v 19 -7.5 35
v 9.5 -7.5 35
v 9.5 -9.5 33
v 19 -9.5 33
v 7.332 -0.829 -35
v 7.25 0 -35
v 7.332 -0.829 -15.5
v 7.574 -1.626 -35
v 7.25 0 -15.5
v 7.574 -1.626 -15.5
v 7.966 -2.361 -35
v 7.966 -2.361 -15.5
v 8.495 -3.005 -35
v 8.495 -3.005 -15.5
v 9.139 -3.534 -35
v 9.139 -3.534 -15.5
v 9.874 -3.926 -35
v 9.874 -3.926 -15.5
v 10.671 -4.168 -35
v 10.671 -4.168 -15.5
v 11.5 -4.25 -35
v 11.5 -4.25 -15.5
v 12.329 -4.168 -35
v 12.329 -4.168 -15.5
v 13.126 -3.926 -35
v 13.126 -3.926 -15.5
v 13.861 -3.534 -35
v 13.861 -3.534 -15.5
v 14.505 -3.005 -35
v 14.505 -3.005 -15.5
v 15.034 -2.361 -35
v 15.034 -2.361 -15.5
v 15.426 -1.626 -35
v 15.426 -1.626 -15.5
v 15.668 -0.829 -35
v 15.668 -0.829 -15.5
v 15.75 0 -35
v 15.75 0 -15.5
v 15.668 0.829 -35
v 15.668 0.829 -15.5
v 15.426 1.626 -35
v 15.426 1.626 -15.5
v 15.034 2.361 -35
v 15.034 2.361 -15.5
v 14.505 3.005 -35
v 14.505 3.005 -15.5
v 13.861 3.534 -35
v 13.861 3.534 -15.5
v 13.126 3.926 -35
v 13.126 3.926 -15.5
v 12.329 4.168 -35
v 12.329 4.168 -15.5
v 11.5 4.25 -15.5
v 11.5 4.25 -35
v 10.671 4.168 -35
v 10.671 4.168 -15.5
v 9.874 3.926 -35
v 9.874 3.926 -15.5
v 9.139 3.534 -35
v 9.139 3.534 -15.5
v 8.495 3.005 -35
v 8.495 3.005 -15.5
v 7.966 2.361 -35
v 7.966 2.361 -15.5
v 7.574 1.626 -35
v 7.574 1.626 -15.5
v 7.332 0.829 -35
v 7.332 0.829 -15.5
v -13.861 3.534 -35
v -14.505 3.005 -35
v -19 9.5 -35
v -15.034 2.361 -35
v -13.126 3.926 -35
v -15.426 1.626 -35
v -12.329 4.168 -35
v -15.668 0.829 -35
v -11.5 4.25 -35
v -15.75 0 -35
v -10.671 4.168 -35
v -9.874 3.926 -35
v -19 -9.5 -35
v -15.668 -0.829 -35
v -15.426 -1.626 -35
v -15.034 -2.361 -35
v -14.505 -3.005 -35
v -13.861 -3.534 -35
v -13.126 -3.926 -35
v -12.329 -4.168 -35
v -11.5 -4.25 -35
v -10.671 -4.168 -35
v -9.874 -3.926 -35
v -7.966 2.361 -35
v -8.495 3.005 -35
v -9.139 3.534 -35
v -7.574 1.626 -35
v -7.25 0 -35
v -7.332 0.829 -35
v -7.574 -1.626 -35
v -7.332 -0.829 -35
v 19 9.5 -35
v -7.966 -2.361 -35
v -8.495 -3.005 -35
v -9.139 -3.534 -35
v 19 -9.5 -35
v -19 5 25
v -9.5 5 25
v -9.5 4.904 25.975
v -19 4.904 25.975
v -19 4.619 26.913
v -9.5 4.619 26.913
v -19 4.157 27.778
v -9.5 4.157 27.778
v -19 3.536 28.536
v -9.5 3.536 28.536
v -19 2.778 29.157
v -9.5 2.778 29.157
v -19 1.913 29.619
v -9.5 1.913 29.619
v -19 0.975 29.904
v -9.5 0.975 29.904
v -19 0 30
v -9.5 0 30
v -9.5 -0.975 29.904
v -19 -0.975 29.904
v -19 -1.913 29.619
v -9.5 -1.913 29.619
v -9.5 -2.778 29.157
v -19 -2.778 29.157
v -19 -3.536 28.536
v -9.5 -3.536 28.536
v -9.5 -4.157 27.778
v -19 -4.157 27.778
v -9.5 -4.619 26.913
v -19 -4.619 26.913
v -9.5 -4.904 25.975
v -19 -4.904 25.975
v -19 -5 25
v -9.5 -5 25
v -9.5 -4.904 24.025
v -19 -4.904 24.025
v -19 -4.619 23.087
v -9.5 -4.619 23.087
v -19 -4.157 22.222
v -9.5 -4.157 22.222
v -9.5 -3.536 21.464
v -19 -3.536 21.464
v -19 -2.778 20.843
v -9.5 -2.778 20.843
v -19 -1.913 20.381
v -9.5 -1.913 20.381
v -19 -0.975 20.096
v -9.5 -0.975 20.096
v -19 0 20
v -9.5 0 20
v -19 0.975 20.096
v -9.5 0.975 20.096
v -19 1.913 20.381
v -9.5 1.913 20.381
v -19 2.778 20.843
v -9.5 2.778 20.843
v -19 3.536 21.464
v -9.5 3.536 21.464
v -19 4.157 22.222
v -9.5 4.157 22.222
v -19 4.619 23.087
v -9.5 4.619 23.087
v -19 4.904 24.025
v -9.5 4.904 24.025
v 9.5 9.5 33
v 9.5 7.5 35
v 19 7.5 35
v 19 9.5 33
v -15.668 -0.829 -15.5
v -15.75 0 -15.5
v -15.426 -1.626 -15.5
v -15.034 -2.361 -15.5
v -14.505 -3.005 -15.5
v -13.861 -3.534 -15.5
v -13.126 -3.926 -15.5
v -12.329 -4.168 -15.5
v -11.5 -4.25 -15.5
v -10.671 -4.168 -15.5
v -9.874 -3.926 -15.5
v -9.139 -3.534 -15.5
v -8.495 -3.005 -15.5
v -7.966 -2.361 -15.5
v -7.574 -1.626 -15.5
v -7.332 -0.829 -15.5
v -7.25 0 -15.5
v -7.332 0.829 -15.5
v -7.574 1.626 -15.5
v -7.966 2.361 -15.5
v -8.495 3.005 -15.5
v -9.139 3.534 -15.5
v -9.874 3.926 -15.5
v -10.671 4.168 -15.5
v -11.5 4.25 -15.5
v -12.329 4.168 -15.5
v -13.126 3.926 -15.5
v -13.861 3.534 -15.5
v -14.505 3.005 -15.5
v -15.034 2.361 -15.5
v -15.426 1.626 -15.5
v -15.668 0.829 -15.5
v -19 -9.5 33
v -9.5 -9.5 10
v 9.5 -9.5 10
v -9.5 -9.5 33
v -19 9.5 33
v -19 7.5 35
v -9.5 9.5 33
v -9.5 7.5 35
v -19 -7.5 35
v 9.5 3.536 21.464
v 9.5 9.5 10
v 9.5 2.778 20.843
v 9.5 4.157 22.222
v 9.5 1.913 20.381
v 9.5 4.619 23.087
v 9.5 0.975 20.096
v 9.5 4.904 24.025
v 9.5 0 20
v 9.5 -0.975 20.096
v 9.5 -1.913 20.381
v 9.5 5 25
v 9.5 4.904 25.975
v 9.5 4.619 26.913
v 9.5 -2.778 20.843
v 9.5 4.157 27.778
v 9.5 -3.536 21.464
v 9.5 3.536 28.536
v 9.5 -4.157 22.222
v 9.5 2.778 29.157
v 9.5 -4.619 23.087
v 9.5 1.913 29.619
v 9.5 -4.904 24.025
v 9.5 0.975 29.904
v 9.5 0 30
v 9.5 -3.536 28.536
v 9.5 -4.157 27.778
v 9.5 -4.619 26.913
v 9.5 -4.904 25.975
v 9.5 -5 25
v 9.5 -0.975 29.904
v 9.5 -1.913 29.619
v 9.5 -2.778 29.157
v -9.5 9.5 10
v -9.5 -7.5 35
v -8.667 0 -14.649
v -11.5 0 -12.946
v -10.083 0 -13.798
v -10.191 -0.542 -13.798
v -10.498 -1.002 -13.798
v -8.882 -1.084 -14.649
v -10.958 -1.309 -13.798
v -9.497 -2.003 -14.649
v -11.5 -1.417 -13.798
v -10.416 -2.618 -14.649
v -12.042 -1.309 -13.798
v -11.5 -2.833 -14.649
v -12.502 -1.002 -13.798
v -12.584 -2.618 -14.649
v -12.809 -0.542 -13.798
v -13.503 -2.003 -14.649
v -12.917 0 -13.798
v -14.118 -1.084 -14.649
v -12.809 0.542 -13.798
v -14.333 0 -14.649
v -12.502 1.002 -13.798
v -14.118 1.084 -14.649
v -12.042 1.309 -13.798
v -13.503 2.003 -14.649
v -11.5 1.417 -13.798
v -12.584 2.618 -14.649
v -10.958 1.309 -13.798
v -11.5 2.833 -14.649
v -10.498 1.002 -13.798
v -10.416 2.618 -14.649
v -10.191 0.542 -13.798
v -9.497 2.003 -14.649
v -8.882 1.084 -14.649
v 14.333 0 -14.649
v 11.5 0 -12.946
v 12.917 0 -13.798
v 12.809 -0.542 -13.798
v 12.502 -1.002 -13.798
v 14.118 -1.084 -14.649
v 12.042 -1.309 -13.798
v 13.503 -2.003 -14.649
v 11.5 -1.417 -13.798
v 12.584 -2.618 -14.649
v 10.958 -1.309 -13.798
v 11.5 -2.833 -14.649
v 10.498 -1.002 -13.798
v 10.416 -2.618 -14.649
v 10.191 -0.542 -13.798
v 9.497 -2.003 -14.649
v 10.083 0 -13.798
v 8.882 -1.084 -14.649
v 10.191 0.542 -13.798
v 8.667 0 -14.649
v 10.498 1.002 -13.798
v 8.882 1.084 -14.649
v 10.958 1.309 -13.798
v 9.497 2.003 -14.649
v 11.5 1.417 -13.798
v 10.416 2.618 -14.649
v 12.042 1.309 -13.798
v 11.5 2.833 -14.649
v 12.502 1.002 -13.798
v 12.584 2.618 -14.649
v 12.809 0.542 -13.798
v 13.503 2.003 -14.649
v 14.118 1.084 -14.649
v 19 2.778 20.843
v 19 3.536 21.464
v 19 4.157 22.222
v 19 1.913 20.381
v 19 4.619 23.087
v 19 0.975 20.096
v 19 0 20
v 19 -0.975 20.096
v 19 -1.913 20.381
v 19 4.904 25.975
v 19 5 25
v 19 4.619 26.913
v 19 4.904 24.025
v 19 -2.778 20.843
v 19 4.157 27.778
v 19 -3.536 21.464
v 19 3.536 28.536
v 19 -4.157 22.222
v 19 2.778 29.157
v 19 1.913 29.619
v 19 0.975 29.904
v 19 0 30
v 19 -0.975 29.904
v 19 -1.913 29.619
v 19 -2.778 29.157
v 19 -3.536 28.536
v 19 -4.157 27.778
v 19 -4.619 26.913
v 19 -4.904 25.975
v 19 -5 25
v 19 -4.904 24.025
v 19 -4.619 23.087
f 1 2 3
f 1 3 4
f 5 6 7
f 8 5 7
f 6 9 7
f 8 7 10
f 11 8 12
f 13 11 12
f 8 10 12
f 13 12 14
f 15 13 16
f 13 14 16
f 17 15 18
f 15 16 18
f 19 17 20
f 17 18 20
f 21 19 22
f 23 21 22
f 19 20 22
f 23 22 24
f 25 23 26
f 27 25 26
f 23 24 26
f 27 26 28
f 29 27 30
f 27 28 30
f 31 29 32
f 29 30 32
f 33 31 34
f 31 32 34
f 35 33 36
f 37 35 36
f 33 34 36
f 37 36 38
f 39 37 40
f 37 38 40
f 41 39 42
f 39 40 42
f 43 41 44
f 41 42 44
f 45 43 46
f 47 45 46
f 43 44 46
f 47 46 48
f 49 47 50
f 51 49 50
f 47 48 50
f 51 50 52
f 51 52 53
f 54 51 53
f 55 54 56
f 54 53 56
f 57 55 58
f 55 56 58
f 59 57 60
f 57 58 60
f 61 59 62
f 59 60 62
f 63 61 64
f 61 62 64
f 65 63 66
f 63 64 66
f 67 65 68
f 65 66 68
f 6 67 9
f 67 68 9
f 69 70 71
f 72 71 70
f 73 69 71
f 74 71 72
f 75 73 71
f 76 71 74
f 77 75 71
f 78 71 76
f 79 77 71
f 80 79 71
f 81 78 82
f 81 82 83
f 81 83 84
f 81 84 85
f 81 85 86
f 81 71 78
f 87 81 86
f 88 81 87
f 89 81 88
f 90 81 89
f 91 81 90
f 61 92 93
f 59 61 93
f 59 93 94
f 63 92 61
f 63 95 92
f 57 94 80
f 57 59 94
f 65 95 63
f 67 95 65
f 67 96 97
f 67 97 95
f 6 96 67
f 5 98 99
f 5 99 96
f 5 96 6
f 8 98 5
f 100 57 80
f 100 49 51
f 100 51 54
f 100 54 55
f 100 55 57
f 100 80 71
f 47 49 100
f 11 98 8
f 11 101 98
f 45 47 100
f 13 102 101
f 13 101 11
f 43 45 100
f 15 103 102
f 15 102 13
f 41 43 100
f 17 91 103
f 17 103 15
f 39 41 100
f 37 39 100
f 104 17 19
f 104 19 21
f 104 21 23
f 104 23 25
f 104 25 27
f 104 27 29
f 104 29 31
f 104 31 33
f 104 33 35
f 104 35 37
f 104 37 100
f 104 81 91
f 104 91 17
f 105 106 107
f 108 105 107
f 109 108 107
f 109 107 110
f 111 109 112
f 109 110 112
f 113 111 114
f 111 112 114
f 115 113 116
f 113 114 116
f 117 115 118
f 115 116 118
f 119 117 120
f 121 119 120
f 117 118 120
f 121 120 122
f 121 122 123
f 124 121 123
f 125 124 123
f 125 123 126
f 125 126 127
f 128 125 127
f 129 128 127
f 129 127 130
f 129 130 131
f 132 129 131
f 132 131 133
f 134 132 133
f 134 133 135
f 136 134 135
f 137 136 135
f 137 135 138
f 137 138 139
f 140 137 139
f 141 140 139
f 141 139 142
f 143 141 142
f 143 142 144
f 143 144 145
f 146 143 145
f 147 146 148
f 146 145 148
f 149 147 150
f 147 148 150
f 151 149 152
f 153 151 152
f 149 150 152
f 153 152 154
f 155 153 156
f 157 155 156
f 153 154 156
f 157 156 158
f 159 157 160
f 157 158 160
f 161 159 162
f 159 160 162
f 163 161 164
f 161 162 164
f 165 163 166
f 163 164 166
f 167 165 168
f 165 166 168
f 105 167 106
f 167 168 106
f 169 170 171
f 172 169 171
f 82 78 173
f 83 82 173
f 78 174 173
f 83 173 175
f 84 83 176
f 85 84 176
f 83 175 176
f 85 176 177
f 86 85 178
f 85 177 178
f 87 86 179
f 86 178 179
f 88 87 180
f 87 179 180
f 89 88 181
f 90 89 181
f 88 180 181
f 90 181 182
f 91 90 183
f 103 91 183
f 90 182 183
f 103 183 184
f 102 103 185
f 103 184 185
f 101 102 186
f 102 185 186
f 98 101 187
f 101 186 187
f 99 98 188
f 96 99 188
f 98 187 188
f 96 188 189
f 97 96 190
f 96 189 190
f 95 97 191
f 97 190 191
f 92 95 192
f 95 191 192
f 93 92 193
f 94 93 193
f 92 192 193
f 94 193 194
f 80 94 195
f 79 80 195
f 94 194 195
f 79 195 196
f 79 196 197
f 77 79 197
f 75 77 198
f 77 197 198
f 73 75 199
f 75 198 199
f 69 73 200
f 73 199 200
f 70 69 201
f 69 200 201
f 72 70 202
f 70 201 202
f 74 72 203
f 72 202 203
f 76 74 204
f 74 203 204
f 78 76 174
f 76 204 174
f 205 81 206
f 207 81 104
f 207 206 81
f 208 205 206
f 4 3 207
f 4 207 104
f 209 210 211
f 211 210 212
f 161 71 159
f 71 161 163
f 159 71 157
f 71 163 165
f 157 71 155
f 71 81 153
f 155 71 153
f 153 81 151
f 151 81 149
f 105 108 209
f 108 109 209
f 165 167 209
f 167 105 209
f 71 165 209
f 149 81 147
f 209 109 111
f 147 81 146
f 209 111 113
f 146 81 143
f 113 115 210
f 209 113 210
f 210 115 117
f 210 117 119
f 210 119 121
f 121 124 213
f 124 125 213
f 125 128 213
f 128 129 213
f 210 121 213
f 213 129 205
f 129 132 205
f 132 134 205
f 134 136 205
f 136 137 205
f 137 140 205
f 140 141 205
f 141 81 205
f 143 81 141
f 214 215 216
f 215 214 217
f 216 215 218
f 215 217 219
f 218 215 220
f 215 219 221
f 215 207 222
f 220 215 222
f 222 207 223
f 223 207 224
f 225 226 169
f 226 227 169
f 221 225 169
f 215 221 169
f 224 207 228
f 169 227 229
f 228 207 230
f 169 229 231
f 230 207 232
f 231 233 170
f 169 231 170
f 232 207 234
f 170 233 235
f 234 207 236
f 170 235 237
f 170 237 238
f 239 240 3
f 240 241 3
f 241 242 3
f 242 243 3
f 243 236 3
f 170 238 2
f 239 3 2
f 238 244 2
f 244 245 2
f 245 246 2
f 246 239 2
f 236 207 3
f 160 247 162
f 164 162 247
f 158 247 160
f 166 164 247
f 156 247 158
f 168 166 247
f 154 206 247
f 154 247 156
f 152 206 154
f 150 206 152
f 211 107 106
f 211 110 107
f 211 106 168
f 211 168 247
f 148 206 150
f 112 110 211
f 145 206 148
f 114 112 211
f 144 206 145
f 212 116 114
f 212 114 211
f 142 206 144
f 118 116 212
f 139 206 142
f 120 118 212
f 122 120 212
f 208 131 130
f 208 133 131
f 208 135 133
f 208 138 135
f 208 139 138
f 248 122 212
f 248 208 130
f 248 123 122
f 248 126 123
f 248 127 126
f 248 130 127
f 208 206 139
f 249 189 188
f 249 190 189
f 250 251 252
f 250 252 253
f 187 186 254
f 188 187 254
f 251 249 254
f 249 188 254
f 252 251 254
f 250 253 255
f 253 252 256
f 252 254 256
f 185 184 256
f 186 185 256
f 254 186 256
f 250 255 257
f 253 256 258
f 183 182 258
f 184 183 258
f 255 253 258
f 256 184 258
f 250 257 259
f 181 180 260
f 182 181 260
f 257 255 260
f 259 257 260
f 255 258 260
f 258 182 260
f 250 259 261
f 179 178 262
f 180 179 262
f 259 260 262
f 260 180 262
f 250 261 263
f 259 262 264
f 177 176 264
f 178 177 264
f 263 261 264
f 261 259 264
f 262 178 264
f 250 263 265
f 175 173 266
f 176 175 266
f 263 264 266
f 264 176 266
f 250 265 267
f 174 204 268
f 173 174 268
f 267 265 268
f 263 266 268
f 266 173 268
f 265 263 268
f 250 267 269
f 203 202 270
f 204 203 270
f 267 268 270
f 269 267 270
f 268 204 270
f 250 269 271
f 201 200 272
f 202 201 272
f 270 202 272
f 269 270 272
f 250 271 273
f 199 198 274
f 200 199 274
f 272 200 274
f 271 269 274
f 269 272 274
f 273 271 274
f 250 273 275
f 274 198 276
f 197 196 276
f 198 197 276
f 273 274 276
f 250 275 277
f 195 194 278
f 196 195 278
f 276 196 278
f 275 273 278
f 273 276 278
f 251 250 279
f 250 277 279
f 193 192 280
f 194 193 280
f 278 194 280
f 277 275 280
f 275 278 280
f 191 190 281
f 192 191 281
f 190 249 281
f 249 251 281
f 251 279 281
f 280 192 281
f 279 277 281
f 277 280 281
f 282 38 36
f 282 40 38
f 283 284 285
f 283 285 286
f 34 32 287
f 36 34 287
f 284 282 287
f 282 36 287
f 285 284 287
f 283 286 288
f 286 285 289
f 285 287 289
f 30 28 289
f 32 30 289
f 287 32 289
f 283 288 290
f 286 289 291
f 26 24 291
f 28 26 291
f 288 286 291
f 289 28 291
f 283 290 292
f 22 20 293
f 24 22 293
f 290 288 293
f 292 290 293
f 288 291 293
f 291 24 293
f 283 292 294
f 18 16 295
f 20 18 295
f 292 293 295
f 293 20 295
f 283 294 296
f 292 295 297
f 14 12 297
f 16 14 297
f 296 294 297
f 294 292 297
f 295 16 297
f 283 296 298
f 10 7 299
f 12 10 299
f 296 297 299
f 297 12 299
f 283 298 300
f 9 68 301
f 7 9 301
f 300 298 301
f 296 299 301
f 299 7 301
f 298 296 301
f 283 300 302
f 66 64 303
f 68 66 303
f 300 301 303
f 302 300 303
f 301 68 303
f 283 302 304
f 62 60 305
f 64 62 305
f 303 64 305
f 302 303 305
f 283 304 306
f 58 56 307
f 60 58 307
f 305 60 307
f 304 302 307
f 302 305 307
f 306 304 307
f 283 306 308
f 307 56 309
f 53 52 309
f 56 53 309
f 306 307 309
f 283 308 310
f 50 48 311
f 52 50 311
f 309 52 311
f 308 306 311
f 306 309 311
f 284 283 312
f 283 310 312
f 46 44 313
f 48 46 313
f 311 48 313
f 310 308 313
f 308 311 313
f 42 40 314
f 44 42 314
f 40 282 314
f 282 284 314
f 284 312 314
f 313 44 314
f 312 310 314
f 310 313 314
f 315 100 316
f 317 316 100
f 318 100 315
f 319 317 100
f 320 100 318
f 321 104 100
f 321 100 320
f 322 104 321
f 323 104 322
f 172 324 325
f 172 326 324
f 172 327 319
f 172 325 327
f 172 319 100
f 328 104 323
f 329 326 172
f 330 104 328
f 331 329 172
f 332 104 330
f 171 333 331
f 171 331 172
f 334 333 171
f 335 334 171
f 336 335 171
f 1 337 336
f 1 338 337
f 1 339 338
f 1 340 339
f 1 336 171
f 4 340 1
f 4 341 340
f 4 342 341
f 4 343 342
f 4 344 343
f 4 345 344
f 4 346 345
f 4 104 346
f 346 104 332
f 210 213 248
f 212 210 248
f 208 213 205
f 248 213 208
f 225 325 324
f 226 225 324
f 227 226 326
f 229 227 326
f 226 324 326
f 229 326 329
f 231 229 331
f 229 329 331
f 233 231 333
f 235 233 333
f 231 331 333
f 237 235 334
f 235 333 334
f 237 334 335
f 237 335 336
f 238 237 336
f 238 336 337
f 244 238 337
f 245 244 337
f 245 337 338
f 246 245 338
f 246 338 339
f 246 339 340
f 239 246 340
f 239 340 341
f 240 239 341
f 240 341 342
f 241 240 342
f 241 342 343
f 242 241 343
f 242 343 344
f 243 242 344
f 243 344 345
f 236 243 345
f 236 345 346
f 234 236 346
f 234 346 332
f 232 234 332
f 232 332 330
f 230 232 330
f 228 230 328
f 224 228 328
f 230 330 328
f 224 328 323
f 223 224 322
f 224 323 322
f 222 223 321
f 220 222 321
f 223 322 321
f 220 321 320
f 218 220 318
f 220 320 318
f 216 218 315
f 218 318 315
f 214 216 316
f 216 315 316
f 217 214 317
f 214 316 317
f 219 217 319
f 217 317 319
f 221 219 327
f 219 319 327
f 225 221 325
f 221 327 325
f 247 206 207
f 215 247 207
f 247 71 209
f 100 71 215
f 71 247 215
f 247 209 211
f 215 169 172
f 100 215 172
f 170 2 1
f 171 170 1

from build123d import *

# Parameters (mm, degrees)
F0_W     = 38
F0_H     = 70
F1_DEPTH = 9.5
F2_W     = 19
F2_H     = 25
F3_DEPTH = 19
F4_R     = 5
F5_DEPTH = 38
F6_SIZE  = 2
F8_D     = 8.5
F8_DEPTH = 19.5
F8_TIP   = 2.5536576309


with BuildPart() as f1:
    # F0 (on Front) → F1 (new body, symmetric)
    with BuildSketch(Plane.XZ):
        Rectangle(F0_W, F0_H)
    extrude(amount=F1_DEPTH, both=True)

    # F2 (on face) → F3 (cut)
    with BuildSketch(Plane.XZ.offset(9.5)):
        with Locations((0, 22.5)):
            Rectangle(F2_W, F2_H)
    extrude(amount=-F3_DEPTH, mode=Mode.SUBTRACT)

    # F4 (on face) → F5 (cut)
    with BuildSketch(Plane.YZ.offset(19)):
        with Locations((0, 25)):
            Circle(F4_R)
    extrude(amount=-F5_DEPTH, mode=Mode.SUBTRACT)

    # F6
    f6_edges = [f1.edges().sort_by_distance(p)[0] for p in [
        (14.25, 9.5, 35),
        (-14.25, 9.5, 35),
        (-14.25, -9.5, 35),
        (14.25, -9.5, 35),
    ]]
    chamfer(f6_edges, length=F6_SIZE)

    # F8
    with Locations(Plane(origin=(0, 0, -35), x_dir=(1, 0, 0), z_dir=(0, 0, -1))):
        with Locations((-11.5, 0), (11.5, 0)):
            Hole(F8_D / 2, depth=F8_DEPTH)
            with Locations((0, 0, -(F8_DEPTH + F8_TIP / 2))):  # 118° drill point
                Cone(0, F8_D / 2, F8_TIP, mode=Mode.SUBTRACT)


solid = f1.part
